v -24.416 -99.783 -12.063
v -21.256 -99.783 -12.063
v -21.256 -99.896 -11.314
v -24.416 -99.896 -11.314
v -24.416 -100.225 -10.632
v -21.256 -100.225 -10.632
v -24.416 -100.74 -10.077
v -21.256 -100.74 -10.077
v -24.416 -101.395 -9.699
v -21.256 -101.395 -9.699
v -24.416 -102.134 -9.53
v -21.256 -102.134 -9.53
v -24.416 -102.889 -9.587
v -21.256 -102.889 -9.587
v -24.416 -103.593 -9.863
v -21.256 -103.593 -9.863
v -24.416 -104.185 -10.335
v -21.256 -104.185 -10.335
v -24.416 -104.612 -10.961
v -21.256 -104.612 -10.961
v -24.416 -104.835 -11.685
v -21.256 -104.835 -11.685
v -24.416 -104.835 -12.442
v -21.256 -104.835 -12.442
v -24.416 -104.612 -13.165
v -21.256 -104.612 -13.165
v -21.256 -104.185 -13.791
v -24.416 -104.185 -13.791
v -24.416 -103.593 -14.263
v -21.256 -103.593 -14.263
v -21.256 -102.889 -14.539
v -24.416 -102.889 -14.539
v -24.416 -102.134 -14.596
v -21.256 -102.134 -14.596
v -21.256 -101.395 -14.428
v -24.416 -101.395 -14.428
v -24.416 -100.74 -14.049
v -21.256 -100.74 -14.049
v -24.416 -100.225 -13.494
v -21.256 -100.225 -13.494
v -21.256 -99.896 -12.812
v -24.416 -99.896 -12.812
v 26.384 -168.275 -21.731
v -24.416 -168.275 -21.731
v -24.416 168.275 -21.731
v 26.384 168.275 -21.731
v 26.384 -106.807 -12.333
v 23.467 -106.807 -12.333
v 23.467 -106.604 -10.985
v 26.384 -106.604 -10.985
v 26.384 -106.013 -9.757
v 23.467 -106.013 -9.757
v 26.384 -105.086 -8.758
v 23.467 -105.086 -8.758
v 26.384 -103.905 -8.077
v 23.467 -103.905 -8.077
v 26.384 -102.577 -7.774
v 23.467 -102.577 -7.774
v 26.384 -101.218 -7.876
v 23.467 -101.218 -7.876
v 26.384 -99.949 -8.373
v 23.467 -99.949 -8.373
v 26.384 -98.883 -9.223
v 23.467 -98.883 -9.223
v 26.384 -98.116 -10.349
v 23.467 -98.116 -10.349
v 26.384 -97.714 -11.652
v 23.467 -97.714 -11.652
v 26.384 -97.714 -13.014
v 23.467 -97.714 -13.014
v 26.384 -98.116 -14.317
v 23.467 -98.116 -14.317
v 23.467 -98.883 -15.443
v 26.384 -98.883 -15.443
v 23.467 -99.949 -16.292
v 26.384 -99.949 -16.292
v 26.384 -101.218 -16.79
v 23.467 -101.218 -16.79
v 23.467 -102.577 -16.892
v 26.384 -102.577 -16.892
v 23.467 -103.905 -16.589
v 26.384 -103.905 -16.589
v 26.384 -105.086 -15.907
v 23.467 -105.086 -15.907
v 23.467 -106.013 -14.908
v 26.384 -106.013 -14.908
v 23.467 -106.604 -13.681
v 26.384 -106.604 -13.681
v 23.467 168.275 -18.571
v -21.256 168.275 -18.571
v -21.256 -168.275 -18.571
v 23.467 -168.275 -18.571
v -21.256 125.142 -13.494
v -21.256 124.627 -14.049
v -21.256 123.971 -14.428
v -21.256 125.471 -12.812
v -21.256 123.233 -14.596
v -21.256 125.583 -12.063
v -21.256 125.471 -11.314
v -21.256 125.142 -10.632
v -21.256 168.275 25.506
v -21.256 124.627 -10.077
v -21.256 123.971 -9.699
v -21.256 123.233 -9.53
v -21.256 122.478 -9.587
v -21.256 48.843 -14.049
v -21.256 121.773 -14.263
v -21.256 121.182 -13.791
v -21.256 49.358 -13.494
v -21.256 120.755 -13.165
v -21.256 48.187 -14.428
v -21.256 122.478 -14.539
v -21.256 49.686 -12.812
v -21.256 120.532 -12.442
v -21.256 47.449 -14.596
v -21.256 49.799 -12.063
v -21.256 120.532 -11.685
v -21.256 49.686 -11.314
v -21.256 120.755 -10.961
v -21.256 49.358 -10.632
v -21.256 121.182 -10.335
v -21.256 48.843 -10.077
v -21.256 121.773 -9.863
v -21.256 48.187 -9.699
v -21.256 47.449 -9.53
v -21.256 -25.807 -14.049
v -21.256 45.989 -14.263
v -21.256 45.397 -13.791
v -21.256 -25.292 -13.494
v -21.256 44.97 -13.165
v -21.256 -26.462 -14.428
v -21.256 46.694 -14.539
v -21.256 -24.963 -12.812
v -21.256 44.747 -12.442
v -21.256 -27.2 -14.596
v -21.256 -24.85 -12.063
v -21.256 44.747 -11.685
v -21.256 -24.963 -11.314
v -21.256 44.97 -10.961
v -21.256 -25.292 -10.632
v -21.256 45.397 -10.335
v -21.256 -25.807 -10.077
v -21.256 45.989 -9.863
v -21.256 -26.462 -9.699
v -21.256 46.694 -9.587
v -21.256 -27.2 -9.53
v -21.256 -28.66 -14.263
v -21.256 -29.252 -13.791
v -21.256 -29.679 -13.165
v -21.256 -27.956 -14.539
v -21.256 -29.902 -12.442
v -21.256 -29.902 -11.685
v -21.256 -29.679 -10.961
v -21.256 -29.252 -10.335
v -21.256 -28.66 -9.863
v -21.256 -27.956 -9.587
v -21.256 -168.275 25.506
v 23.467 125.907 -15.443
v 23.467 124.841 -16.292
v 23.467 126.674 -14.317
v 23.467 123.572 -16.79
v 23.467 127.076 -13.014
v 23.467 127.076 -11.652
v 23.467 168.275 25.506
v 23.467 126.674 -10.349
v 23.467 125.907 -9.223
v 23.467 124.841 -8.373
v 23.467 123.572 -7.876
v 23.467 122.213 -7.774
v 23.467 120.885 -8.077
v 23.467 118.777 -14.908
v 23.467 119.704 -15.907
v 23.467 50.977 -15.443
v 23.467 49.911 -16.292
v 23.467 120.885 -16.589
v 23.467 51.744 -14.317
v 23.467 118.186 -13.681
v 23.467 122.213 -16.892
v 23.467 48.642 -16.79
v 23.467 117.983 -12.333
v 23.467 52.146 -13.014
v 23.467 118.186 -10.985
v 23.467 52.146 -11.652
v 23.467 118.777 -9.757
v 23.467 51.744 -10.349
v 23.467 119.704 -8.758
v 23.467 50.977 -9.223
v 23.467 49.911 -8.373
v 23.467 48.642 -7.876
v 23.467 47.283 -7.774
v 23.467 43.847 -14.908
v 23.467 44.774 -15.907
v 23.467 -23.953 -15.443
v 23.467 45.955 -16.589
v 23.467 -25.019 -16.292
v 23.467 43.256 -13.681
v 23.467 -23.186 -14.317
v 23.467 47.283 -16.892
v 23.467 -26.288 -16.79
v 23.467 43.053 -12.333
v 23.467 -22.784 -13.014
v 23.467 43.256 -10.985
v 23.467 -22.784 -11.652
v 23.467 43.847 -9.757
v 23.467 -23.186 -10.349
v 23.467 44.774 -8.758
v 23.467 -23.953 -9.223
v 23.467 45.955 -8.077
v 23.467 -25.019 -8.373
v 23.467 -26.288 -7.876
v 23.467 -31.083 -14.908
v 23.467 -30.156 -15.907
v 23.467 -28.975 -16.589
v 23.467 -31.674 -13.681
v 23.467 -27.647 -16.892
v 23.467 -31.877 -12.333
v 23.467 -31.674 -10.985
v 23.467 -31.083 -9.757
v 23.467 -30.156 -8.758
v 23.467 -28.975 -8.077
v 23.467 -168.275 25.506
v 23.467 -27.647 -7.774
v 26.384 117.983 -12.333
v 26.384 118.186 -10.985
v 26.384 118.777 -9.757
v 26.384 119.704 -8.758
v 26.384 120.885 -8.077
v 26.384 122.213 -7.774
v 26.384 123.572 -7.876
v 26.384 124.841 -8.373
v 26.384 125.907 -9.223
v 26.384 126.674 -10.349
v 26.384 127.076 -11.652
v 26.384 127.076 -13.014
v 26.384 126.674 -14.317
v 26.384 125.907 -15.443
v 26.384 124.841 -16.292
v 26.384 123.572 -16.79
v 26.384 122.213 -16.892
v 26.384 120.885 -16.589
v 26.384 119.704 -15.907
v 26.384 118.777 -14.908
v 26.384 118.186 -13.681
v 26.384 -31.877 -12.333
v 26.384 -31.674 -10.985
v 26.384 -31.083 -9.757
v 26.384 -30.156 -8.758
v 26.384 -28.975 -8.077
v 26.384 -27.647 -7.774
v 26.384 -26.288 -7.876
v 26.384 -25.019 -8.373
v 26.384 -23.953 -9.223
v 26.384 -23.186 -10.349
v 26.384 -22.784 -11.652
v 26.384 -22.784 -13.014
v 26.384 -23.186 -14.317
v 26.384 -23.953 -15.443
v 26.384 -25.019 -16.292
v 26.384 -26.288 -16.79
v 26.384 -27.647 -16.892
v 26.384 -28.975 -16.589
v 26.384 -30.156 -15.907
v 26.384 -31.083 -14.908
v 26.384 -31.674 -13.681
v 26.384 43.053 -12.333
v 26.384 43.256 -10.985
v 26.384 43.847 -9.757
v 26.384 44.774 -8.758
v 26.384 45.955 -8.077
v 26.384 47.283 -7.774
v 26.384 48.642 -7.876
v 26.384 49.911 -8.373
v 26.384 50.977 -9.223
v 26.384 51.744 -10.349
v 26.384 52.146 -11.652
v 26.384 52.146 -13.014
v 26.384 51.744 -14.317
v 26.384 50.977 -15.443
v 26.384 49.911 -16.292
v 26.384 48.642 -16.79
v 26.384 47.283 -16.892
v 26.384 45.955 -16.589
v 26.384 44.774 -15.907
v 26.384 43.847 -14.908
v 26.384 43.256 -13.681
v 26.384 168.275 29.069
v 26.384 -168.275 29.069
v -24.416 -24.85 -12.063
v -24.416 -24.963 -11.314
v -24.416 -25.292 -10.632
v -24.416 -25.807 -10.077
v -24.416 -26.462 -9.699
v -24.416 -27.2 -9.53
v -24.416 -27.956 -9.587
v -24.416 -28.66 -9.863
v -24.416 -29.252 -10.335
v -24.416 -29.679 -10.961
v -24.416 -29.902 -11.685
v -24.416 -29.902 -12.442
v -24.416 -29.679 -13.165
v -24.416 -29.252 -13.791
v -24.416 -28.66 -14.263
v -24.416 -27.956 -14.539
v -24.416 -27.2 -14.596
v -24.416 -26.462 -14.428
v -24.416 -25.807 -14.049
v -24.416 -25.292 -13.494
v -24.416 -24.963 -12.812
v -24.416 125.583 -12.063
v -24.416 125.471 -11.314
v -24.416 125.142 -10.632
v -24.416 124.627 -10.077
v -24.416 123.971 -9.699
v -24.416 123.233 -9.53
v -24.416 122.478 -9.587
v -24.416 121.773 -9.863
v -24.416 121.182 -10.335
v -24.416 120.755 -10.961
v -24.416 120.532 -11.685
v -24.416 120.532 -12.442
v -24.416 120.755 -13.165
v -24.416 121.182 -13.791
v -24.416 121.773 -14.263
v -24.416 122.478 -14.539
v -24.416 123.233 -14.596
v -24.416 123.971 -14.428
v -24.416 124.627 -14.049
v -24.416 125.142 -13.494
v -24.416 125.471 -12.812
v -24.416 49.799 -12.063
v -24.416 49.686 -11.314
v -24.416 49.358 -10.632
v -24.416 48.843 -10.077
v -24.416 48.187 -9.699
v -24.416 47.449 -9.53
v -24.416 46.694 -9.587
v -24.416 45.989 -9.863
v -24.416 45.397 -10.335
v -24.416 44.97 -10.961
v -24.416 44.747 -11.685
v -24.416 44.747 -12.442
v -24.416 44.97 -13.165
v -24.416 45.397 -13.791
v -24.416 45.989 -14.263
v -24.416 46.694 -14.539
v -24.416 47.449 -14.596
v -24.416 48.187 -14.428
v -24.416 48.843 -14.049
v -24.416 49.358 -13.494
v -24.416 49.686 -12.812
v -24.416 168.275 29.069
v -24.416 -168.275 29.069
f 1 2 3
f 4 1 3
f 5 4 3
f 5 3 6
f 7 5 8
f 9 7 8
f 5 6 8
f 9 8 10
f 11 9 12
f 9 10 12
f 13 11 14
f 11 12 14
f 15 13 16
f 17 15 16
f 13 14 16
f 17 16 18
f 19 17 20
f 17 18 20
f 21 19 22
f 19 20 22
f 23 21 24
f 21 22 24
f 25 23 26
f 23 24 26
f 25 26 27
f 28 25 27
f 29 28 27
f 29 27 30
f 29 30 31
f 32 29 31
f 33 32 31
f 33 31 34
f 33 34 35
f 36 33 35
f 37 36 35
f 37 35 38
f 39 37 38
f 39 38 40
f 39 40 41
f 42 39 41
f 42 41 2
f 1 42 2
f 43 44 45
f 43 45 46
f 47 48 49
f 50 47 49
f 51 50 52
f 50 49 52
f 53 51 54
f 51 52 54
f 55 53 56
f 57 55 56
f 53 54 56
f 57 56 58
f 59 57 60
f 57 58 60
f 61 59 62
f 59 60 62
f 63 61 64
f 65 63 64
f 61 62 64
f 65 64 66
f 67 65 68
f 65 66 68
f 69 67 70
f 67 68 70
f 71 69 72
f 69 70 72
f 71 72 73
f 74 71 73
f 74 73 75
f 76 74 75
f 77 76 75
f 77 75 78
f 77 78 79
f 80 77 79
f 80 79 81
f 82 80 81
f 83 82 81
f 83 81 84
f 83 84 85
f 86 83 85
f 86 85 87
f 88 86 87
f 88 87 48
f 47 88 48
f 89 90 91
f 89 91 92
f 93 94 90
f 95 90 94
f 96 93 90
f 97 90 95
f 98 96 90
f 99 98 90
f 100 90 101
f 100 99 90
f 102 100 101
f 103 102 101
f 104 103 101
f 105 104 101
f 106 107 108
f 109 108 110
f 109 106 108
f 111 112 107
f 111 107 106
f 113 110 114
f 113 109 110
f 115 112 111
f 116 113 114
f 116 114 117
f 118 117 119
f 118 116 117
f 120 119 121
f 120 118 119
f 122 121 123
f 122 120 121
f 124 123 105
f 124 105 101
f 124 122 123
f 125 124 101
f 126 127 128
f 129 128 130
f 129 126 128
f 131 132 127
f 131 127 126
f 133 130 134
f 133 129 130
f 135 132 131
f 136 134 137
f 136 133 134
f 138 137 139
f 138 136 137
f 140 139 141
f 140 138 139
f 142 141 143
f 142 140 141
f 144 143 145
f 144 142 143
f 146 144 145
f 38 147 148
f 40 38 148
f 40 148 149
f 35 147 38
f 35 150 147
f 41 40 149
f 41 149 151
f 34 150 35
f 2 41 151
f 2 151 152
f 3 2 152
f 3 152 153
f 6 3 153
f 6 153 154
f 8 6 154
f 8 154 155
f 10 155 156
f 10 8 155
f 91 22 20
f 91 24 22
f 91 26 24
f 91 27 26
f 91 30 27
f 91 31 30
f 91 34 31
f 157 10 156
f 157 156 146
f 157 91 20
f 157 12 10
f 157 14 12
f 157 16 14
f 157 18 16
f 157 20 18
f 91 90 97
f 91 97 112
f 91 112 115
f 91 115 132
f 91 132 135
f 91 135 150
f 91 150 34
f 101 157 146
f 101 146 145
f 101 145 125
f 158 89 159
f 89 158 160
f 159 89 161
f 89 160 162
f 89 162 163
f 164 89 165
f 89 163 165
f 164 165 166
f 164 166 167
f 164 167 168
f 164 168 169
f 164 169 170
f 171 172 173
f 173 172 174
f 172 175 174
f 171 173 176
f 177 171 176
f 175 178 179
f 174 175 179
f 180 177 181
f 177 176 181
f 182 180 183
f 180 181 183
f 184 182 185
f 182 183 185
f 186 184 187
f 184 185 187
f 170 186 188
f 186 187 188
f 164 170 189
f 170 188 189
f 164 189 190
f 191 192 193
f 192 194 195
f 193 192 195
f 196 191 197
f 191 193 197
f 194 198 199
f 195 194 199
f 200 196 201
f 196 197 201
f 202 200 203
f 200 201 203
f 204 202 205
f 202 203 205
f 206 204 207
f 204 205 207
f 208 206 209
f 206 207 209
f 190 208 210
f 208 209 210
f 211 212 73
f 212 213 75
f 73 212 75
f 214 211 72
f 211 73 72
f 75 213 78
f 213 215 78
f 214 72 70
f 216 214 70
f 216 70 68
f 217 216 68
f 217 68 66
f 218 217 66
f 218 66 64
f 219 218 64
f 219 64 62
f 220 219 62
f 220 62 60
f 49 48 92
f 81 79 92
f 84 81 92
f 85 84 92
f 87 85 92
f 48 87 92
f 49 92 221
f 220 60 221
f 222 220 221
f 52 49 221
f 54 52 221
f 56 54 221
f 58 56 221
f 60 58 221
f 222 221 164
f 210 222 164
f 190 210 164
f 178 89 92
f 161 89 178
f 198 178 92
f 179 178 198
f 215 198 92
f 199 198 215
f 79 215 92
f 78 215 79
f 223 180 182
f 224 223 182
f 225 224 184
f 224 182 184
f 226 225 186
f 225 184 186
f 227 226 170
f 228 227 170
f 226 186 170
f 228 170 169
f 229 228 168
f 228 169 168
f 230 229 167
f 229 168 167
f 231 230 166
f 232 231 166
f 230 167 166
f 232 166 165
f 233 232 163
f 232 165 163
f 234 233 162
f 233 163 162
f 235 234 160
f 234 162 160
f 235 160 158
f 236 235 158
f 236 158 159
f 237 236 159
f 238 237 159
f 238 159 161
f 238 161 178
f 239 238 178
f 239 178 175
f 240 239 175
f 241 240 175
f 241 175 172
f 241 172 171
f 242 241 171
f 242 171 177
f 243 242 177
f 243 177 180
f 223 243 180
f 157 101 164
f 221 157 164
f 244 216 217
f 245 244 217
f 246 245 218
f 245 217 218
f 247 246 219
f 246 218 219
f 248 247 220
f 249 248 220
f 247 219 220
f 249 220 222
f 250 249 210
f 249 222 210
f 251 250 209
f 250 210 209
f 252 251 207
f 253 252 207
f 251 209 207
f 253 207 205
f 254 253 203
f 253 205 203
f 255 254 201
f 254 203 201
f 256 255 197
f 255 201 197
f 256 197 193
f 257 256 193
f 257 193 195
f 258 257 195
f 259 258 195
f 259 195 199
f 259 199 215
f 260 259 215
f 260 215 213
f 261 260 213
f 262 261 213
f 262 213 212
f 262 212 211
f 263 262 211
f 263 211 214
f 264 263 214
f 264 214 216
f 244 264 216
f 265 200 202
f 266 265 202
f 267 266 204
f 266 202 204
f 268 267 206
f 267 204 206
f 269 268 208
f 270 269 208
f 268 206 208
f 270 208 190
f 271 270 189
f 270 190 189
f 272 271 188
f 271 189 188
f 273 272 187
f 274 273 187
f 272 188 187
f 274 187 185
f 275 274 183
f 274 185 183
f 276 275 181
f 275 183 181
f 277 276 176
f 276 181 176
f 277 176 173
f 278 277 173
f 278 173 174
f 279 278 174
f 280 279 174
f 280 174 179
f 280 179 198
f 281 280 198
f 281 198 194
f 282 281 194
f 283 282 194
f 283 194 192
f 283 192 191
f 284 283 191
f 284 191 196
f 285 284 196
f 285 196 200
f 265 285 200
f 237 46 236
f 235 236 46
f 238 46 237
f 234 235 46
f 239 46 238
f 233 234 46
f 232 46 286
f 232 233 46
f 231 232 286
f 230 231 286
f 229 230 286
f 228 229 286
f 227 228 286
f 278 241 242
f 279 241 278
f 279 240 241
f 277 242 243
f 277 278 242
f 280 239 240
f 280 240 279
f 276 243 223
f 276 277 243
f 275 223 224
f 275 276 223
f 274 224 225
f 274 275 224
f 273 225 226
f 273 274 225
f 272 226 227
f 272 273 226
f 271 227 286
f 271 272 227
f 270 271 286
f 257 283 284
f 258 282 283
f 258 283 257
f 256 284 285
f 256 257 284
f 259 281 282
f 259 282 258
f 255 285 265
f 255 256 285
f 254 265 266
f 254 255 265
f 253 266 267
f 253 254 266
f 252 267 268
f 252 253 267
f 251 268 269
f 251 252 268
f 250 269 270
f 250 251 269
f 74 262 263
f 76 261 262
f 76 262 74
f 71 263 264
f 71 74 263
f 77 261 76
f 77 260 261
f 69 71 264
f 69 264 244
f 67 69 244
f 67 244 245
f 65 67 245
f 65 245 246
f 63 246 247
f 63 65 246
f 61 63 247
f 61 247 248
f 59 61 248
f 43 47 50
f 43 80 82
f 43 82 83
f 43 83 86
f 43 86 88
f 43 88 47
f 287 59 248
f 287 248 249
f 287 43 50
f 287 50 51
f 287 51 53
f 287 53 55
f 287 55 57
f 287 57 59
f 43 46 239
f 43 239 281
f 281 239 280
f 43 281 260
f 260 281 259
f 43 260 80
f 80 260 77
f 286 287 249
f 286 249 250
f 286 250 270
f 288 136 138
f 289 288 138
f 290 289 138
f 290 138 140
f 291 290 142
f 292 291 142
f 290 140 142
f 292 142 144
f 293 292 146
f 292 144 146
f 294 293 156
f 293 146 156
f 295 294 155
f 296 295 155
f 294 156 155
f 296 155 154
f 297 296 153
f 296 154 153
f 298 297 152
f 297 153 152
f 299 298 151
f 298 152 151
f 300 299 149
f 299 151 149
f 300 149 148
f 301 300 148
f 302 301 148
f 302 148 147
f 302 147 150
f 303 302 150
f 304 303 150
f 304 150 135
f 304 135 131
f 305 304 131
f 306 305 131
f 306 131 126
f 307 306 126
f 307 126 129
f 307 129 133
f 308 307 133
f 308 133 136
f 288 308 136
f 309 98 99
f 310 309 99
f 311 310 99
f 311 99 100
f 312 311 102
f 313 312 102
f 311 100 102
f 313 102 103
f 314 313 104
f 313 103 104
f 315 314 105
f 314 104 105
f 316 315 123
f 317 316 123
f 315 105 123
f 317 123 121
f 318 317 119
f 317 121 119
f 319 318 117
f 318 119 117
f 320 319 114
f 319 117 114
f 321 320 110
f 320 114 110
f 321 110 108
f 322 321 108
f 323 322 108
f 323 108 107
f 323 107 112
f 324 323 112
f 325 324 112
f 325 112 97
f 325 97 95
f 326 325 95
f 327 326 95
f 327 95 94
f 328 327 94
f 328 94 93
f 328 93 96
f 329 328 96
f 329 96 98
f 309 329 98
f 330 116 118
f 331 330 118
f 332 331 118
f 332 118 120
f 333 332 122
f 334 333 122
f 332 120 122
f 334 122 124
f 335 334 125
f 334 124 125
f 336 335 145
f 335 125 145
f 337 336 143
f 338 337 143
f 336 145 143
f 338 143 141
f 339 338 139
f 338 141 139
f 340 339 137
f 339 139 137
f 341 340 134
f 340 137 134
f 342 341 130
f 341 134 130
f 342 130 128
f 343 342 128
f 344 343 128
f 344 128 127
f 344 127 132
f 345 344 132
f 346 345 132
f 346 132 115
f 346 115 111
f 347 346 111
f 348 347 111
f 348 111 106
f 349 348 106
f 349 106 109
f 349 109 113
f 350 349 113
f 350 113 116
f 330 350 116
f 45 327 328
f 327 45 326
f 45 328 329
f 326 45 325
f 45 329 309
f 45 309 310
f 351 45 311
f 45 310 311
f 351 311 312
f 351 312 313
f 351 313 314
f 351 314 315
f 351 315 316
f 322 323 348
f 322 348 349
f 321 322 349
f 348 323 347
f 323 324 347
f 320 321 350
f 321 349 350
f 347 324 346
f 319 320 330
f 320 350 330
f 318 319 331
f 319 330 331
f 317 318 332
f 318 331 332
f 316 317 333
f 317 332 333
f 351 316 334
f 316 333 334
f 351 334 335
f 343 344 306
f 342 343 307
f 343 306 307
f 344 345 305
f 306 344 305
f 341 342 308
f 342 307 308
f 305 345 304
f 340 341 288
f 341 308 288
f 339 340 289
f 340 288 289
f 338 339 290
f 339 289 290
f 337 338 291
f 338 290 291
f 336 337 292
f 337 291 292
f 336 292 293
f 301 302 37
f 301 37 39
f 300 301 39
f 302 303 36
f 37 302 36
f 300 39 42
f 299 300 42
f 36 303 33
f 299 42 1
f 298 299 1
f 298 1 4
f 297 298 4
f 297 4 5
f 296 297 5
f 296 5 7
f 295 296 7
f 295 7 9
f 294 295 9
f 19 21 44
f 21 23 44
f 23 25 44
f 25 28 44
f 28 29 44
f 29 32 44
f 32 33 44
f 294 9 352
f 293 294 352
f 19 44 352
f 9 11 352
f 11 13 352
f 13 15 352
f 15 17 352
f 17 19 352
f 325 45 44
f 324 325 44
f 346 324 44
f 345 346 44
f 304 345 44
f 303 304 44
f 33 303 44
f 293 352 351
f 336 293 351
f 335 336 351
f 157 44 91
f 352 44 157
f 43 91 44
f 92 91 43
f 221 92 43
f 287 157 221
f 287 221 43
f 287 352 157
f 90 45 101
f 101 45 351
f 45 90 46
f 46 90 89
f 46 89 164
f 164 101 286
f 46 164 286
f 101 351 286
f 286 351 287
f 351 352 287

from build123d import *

# Parameters (mm, degrees)
F0_W     = 50.8
F0_H     = 50.8
F0_W_2   = 44.7234460877
F0_H_2   = 44.0774458626
F1_DEPTH = 168.275
F3_D     = 9.144
F3_DEPTH = 25.4
F3_TIP   = 2.7471347502
F5_D     = 5.08
F5_DEPTH = 25.4
F5_TIP   = 1.5261859723


with BuildPart() as f1:
    # F0 (on Front) → F1 (new body, symmetric)
    with BuildSketch(Plane.XZ):
        with Locations((0.9841322899, 3.6690509832)):
            Rectangle(F0_W, F0_H)
        with Locations((1.1056640122, 3.467582593)):
            Rectangle(F0_W_2, F0_H_2, mode=Mode.SUBTRACT)
    extrude(amount=F1_DEPTH, both=True)

    # F3
    with Locations(Plane.YZ.offset(26.3841322899)):
        with Locations((-102.235, -12.3329490168), (-27.305, -12.3329490168), (47.625, -12.3329490168), (122.555, -12.3329490168)):
            Hole(F3_D / 2, depth=F3_DEPTH)
            with Locations((0, 0, -(F3_DEPTH + F3_TIP / 2))):  # 118° drill point
                Cone(0, F3_D / 2, F3_TIP, mode=Mode.SUBTRACT)

    # F5
    with Locations(Plane(origin=(-24.4158677101, 0, 0), x_dir=(0, -1, 0), z_dir=(-1, 0, 0))):
        with Locations((-123.0434924364, -12.0630878955), (-47.2589172423, -12.0630878955), (27.3903068155, -12.0630878955), (102.3233607411, -12.0630878955)):
            Hole(F5_D / 2, depth=F5_DEPTH)
            with Locations((0, 0, -(F5_DEPTH + F5_TIP / 2))):  # 118° drill point
                Cone(0, F5_D / 2, F5_TIP, mode=Mode.SUBTRACT)


solid = f1.part
